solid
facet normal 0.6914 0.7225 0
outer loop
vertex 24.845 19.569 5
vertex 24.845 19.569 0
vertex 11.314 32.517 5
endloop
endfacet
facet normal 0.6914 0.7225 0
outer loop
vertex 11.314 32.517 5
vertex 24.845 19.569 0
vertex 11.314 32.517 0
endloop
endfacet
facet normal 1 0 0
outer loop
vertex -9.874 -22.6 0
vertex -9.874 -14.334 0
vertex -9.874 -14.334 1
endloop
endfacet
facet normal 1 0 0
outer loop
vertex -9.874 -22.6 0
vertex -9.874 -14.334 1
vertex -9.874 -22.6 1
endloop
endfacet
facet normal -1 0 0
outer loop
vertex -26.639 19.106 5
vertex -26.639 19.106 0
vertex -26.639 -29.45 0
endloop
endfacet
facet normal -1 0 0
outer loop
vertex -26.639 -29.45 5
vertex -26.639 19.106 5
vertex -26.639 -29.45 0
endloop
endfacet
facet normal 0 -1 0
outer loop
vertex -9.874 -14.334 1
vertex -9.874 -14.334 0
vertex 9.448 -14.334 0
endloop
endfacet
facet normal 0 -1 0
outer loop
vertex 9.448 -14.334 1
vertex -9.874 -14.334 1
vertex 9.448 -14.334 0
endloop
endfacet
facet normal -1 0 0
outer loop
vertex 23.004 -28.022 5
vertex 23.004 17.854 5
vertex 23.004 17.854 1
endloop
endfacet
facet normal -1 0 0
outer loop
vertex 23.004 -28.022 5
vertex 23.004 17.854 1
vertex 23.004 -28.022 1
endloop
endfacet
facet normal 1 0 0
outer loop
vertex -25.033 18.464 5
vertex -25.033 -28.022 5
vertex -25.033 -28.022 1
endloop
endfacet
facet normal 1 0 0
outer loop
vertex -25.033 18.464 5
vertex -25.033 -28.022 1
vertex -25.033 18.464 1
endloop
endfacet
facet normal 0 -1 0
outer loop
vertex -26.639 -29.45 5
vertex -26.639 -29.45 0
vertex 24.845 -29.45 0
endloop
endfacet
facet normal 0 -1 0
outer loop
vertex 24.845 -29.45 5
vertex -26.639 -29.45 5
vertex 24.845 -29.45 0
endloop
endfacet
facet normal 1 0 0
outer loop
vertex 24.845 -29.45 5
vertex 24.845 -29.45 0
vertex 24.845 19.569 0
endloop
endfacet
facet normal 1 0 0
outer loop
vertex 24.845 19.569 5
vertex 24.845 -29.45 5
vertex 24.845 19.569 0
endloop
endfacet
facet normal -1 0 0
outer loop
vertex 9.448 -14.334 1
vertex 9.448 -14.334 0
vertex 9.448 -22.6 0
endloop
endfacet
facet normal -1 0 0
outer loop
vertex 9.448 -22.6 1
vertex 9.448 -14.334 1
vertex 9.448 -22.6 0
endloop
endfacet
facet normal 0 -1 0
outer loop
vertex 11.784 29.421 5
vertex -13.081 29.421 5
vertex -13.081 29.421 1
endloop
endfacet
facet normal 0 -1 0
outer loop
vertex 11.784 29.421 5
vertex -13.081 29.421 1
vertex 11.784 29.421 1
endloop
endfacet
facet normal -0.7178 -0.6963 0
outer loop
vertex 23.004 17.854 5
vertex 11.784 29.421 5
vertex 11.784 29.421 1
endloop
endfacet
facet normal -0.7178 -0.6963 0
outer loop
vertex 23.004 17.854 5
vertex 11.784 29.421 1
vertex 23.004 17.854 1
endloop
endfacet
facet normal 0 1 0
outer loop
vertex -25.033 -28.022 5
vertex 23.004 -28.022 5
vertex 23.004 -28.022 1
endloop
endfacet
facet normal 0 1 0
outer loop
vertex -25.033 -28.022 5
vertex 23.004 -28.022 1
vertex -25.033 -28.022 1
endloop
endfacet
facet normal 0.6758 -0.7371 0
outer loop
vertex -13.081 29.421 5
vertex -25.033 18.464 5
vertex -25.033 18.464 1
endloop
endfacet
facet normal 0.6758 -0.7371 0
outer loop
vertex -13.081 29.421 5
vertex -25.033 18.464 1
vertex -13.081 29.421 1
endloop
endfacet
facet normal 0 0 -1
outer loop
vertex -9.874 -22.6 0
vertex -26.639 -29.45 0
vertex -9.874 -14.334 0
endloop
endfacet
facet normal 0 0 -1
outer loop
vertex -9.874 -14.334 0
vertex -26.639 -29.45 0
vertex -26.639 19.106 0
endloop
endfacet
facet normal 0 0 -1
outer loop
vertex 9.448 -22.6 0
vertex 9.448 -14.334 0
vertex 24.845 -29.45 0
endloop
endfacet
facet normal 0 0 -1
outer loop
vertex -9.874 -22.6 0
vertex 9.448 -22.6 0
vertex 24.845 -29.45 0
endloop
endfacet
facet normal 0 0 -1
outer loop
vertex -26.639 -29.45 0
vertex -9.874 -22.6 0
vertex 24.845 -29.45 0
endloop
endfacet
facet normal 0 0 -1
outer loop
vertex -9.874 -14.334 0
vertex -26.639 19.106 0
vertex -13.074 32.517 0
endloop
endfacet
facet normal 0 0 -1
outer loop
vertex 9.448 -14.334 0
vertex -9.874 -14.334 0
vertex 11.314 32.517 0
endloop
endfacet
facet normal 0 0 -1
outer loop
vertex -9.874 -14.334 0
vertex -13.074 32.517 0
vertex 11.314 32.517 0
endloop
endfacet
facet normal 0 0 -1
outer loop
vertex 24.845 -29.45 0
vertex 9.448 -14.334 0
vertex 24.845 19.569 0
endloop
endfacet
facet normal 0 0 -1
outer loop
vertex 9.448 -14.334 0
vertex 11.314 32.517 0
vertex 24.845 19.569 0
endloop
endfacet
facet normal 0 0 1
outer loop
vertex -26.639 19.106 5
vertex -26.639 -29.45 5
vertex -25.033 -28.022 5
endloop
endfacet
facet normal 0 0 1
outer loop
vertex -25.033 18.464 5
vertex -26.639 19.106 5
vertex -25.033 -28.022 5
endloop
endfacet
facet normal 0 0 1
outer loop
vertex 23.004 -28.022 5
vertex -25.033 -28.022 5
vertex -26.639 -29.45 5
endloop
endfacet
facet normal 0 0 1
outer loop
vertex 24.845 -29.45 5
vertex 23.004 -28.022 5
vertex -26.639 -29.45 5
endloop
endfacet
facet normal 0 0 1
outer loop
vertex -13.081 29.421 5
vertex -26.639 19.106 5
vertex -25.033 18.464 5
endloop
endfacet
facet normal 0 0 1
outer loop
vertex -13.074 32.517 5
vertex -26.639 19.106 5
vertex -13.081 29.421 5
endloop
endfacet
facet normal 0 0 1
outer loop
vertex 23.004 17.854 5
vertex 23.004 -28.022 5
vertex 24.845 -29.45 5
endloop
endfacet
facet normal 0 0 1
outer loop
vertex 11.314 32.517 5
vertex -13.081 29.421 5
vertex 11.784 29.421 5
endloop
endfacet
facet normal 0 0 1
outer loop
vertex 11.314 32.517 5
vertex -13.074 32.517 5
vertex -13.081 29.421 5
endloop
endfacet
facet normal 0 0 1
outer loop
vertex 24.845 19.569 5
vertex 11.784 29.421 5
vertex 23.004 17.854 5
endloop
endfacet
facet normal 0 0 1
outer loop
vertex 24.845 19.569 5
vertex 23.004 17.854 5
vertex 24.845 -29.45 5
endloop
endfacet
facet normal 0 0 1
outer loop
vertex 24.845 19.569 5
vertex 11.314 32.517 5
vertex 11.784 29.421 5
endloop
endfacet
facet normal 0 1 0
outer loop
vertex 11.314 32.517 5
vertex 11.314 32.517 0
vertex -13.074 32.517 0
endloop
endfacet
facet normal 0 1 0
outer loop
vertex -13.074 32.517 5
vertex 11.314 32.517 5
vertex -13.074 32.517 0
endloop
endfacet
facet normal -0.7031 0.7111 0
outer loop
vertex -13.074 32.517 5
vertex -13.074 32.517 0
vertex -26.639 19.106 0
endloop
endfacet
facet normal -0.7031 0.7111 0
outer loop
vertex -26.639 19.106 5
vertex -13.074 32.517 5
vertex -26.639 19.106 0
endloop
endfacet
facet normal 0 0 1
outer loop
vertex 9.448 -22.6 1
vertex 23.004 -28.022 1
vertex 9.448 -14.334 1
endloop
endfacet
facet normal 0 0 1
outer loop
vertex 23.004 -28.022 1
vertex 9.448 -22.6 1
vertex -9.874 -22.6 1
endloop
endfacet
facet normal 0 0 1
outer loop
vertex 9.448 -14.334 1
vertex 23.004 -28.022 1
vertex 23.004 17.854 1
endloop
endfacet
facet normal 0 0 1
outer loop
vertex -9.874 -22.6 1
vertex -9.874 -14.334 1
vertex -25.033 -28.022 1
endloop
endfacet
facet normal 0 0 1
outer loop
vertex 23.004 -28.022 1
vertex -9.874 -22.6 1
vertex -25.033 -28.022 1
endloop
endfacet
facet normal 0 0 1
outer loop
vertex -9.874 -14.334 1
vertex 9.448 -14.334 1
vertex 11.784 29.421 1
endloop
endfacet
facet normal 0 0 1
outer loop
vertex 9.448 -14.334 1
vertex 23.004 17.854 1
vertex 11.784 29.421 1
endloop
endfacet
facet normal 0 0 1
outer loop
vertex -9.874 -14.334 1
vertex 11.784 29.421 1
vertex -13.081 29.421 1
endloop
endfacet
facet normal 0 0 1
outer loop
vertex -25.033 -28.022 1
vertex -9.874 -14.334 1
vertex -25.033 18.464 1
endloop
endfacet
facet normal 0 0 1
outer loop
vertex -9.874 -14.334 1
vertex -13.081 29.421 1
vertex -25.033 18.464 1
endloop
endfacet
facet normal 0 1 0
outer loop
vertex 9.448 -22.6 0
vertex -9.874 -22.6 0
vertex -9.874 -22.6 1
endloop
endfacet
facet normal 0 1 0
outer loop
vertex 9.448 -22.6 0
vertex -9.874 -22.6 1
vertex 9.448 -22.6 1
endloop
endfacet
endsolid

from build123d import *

# Parameters (mm, degrees)
PAD026_DEPTH    = 5
POCKET005_DEPTH = 4
SKETCH030_W     = 19.322021
SKETCH030_H     = 8.266103
POCKET006_DEPTH = 5


with BuildPart() as part:
    # Sketch028 → Pad026 (new body)
    with BuildSketch(Plane.XY):
        Polygon((-13.074139, 32.516678), (-26.638874, 19.106085), (-26.638874, -29.449505), (24.845465, -29.449505), (24.845465, 19.568523), (11.313561, 32.516678), align=None)
    extrude(amount=PAD026_DEPTH)

    # Sketch029 (on Face8 of Pad026) → Pocket005 (cut)
    with BuildSketch(Plane.XY.offset(5)):
        Polygon((-25.033306, 18.464409), (-13.081248, 29.420872), (11.783705, 29.420872), (23.004097, 17.85417), (23.004097, -28.02212), (-25.033306, -28.02212), align=None)
    extrude(amount=-POCKET005_DEPTH, mode=Mode.SUBTRACT)

    # Sketch030 (on Face4 of Pocket005) → Pocket006 (cut)
    with BuildSketch(Plane(origin=(0, 0, 0), x_dir=(1, 0, 0), z_dir=(0, 0, -1))):
        with Locations((-0.2128295, 18.4669375)):
            Rectangle(SKETCH030_W, SKETCH030_H)
    extrude(amount=-POCKET006_DEPTH, mode=Mode.SUBTRACT)


solid = part.part
